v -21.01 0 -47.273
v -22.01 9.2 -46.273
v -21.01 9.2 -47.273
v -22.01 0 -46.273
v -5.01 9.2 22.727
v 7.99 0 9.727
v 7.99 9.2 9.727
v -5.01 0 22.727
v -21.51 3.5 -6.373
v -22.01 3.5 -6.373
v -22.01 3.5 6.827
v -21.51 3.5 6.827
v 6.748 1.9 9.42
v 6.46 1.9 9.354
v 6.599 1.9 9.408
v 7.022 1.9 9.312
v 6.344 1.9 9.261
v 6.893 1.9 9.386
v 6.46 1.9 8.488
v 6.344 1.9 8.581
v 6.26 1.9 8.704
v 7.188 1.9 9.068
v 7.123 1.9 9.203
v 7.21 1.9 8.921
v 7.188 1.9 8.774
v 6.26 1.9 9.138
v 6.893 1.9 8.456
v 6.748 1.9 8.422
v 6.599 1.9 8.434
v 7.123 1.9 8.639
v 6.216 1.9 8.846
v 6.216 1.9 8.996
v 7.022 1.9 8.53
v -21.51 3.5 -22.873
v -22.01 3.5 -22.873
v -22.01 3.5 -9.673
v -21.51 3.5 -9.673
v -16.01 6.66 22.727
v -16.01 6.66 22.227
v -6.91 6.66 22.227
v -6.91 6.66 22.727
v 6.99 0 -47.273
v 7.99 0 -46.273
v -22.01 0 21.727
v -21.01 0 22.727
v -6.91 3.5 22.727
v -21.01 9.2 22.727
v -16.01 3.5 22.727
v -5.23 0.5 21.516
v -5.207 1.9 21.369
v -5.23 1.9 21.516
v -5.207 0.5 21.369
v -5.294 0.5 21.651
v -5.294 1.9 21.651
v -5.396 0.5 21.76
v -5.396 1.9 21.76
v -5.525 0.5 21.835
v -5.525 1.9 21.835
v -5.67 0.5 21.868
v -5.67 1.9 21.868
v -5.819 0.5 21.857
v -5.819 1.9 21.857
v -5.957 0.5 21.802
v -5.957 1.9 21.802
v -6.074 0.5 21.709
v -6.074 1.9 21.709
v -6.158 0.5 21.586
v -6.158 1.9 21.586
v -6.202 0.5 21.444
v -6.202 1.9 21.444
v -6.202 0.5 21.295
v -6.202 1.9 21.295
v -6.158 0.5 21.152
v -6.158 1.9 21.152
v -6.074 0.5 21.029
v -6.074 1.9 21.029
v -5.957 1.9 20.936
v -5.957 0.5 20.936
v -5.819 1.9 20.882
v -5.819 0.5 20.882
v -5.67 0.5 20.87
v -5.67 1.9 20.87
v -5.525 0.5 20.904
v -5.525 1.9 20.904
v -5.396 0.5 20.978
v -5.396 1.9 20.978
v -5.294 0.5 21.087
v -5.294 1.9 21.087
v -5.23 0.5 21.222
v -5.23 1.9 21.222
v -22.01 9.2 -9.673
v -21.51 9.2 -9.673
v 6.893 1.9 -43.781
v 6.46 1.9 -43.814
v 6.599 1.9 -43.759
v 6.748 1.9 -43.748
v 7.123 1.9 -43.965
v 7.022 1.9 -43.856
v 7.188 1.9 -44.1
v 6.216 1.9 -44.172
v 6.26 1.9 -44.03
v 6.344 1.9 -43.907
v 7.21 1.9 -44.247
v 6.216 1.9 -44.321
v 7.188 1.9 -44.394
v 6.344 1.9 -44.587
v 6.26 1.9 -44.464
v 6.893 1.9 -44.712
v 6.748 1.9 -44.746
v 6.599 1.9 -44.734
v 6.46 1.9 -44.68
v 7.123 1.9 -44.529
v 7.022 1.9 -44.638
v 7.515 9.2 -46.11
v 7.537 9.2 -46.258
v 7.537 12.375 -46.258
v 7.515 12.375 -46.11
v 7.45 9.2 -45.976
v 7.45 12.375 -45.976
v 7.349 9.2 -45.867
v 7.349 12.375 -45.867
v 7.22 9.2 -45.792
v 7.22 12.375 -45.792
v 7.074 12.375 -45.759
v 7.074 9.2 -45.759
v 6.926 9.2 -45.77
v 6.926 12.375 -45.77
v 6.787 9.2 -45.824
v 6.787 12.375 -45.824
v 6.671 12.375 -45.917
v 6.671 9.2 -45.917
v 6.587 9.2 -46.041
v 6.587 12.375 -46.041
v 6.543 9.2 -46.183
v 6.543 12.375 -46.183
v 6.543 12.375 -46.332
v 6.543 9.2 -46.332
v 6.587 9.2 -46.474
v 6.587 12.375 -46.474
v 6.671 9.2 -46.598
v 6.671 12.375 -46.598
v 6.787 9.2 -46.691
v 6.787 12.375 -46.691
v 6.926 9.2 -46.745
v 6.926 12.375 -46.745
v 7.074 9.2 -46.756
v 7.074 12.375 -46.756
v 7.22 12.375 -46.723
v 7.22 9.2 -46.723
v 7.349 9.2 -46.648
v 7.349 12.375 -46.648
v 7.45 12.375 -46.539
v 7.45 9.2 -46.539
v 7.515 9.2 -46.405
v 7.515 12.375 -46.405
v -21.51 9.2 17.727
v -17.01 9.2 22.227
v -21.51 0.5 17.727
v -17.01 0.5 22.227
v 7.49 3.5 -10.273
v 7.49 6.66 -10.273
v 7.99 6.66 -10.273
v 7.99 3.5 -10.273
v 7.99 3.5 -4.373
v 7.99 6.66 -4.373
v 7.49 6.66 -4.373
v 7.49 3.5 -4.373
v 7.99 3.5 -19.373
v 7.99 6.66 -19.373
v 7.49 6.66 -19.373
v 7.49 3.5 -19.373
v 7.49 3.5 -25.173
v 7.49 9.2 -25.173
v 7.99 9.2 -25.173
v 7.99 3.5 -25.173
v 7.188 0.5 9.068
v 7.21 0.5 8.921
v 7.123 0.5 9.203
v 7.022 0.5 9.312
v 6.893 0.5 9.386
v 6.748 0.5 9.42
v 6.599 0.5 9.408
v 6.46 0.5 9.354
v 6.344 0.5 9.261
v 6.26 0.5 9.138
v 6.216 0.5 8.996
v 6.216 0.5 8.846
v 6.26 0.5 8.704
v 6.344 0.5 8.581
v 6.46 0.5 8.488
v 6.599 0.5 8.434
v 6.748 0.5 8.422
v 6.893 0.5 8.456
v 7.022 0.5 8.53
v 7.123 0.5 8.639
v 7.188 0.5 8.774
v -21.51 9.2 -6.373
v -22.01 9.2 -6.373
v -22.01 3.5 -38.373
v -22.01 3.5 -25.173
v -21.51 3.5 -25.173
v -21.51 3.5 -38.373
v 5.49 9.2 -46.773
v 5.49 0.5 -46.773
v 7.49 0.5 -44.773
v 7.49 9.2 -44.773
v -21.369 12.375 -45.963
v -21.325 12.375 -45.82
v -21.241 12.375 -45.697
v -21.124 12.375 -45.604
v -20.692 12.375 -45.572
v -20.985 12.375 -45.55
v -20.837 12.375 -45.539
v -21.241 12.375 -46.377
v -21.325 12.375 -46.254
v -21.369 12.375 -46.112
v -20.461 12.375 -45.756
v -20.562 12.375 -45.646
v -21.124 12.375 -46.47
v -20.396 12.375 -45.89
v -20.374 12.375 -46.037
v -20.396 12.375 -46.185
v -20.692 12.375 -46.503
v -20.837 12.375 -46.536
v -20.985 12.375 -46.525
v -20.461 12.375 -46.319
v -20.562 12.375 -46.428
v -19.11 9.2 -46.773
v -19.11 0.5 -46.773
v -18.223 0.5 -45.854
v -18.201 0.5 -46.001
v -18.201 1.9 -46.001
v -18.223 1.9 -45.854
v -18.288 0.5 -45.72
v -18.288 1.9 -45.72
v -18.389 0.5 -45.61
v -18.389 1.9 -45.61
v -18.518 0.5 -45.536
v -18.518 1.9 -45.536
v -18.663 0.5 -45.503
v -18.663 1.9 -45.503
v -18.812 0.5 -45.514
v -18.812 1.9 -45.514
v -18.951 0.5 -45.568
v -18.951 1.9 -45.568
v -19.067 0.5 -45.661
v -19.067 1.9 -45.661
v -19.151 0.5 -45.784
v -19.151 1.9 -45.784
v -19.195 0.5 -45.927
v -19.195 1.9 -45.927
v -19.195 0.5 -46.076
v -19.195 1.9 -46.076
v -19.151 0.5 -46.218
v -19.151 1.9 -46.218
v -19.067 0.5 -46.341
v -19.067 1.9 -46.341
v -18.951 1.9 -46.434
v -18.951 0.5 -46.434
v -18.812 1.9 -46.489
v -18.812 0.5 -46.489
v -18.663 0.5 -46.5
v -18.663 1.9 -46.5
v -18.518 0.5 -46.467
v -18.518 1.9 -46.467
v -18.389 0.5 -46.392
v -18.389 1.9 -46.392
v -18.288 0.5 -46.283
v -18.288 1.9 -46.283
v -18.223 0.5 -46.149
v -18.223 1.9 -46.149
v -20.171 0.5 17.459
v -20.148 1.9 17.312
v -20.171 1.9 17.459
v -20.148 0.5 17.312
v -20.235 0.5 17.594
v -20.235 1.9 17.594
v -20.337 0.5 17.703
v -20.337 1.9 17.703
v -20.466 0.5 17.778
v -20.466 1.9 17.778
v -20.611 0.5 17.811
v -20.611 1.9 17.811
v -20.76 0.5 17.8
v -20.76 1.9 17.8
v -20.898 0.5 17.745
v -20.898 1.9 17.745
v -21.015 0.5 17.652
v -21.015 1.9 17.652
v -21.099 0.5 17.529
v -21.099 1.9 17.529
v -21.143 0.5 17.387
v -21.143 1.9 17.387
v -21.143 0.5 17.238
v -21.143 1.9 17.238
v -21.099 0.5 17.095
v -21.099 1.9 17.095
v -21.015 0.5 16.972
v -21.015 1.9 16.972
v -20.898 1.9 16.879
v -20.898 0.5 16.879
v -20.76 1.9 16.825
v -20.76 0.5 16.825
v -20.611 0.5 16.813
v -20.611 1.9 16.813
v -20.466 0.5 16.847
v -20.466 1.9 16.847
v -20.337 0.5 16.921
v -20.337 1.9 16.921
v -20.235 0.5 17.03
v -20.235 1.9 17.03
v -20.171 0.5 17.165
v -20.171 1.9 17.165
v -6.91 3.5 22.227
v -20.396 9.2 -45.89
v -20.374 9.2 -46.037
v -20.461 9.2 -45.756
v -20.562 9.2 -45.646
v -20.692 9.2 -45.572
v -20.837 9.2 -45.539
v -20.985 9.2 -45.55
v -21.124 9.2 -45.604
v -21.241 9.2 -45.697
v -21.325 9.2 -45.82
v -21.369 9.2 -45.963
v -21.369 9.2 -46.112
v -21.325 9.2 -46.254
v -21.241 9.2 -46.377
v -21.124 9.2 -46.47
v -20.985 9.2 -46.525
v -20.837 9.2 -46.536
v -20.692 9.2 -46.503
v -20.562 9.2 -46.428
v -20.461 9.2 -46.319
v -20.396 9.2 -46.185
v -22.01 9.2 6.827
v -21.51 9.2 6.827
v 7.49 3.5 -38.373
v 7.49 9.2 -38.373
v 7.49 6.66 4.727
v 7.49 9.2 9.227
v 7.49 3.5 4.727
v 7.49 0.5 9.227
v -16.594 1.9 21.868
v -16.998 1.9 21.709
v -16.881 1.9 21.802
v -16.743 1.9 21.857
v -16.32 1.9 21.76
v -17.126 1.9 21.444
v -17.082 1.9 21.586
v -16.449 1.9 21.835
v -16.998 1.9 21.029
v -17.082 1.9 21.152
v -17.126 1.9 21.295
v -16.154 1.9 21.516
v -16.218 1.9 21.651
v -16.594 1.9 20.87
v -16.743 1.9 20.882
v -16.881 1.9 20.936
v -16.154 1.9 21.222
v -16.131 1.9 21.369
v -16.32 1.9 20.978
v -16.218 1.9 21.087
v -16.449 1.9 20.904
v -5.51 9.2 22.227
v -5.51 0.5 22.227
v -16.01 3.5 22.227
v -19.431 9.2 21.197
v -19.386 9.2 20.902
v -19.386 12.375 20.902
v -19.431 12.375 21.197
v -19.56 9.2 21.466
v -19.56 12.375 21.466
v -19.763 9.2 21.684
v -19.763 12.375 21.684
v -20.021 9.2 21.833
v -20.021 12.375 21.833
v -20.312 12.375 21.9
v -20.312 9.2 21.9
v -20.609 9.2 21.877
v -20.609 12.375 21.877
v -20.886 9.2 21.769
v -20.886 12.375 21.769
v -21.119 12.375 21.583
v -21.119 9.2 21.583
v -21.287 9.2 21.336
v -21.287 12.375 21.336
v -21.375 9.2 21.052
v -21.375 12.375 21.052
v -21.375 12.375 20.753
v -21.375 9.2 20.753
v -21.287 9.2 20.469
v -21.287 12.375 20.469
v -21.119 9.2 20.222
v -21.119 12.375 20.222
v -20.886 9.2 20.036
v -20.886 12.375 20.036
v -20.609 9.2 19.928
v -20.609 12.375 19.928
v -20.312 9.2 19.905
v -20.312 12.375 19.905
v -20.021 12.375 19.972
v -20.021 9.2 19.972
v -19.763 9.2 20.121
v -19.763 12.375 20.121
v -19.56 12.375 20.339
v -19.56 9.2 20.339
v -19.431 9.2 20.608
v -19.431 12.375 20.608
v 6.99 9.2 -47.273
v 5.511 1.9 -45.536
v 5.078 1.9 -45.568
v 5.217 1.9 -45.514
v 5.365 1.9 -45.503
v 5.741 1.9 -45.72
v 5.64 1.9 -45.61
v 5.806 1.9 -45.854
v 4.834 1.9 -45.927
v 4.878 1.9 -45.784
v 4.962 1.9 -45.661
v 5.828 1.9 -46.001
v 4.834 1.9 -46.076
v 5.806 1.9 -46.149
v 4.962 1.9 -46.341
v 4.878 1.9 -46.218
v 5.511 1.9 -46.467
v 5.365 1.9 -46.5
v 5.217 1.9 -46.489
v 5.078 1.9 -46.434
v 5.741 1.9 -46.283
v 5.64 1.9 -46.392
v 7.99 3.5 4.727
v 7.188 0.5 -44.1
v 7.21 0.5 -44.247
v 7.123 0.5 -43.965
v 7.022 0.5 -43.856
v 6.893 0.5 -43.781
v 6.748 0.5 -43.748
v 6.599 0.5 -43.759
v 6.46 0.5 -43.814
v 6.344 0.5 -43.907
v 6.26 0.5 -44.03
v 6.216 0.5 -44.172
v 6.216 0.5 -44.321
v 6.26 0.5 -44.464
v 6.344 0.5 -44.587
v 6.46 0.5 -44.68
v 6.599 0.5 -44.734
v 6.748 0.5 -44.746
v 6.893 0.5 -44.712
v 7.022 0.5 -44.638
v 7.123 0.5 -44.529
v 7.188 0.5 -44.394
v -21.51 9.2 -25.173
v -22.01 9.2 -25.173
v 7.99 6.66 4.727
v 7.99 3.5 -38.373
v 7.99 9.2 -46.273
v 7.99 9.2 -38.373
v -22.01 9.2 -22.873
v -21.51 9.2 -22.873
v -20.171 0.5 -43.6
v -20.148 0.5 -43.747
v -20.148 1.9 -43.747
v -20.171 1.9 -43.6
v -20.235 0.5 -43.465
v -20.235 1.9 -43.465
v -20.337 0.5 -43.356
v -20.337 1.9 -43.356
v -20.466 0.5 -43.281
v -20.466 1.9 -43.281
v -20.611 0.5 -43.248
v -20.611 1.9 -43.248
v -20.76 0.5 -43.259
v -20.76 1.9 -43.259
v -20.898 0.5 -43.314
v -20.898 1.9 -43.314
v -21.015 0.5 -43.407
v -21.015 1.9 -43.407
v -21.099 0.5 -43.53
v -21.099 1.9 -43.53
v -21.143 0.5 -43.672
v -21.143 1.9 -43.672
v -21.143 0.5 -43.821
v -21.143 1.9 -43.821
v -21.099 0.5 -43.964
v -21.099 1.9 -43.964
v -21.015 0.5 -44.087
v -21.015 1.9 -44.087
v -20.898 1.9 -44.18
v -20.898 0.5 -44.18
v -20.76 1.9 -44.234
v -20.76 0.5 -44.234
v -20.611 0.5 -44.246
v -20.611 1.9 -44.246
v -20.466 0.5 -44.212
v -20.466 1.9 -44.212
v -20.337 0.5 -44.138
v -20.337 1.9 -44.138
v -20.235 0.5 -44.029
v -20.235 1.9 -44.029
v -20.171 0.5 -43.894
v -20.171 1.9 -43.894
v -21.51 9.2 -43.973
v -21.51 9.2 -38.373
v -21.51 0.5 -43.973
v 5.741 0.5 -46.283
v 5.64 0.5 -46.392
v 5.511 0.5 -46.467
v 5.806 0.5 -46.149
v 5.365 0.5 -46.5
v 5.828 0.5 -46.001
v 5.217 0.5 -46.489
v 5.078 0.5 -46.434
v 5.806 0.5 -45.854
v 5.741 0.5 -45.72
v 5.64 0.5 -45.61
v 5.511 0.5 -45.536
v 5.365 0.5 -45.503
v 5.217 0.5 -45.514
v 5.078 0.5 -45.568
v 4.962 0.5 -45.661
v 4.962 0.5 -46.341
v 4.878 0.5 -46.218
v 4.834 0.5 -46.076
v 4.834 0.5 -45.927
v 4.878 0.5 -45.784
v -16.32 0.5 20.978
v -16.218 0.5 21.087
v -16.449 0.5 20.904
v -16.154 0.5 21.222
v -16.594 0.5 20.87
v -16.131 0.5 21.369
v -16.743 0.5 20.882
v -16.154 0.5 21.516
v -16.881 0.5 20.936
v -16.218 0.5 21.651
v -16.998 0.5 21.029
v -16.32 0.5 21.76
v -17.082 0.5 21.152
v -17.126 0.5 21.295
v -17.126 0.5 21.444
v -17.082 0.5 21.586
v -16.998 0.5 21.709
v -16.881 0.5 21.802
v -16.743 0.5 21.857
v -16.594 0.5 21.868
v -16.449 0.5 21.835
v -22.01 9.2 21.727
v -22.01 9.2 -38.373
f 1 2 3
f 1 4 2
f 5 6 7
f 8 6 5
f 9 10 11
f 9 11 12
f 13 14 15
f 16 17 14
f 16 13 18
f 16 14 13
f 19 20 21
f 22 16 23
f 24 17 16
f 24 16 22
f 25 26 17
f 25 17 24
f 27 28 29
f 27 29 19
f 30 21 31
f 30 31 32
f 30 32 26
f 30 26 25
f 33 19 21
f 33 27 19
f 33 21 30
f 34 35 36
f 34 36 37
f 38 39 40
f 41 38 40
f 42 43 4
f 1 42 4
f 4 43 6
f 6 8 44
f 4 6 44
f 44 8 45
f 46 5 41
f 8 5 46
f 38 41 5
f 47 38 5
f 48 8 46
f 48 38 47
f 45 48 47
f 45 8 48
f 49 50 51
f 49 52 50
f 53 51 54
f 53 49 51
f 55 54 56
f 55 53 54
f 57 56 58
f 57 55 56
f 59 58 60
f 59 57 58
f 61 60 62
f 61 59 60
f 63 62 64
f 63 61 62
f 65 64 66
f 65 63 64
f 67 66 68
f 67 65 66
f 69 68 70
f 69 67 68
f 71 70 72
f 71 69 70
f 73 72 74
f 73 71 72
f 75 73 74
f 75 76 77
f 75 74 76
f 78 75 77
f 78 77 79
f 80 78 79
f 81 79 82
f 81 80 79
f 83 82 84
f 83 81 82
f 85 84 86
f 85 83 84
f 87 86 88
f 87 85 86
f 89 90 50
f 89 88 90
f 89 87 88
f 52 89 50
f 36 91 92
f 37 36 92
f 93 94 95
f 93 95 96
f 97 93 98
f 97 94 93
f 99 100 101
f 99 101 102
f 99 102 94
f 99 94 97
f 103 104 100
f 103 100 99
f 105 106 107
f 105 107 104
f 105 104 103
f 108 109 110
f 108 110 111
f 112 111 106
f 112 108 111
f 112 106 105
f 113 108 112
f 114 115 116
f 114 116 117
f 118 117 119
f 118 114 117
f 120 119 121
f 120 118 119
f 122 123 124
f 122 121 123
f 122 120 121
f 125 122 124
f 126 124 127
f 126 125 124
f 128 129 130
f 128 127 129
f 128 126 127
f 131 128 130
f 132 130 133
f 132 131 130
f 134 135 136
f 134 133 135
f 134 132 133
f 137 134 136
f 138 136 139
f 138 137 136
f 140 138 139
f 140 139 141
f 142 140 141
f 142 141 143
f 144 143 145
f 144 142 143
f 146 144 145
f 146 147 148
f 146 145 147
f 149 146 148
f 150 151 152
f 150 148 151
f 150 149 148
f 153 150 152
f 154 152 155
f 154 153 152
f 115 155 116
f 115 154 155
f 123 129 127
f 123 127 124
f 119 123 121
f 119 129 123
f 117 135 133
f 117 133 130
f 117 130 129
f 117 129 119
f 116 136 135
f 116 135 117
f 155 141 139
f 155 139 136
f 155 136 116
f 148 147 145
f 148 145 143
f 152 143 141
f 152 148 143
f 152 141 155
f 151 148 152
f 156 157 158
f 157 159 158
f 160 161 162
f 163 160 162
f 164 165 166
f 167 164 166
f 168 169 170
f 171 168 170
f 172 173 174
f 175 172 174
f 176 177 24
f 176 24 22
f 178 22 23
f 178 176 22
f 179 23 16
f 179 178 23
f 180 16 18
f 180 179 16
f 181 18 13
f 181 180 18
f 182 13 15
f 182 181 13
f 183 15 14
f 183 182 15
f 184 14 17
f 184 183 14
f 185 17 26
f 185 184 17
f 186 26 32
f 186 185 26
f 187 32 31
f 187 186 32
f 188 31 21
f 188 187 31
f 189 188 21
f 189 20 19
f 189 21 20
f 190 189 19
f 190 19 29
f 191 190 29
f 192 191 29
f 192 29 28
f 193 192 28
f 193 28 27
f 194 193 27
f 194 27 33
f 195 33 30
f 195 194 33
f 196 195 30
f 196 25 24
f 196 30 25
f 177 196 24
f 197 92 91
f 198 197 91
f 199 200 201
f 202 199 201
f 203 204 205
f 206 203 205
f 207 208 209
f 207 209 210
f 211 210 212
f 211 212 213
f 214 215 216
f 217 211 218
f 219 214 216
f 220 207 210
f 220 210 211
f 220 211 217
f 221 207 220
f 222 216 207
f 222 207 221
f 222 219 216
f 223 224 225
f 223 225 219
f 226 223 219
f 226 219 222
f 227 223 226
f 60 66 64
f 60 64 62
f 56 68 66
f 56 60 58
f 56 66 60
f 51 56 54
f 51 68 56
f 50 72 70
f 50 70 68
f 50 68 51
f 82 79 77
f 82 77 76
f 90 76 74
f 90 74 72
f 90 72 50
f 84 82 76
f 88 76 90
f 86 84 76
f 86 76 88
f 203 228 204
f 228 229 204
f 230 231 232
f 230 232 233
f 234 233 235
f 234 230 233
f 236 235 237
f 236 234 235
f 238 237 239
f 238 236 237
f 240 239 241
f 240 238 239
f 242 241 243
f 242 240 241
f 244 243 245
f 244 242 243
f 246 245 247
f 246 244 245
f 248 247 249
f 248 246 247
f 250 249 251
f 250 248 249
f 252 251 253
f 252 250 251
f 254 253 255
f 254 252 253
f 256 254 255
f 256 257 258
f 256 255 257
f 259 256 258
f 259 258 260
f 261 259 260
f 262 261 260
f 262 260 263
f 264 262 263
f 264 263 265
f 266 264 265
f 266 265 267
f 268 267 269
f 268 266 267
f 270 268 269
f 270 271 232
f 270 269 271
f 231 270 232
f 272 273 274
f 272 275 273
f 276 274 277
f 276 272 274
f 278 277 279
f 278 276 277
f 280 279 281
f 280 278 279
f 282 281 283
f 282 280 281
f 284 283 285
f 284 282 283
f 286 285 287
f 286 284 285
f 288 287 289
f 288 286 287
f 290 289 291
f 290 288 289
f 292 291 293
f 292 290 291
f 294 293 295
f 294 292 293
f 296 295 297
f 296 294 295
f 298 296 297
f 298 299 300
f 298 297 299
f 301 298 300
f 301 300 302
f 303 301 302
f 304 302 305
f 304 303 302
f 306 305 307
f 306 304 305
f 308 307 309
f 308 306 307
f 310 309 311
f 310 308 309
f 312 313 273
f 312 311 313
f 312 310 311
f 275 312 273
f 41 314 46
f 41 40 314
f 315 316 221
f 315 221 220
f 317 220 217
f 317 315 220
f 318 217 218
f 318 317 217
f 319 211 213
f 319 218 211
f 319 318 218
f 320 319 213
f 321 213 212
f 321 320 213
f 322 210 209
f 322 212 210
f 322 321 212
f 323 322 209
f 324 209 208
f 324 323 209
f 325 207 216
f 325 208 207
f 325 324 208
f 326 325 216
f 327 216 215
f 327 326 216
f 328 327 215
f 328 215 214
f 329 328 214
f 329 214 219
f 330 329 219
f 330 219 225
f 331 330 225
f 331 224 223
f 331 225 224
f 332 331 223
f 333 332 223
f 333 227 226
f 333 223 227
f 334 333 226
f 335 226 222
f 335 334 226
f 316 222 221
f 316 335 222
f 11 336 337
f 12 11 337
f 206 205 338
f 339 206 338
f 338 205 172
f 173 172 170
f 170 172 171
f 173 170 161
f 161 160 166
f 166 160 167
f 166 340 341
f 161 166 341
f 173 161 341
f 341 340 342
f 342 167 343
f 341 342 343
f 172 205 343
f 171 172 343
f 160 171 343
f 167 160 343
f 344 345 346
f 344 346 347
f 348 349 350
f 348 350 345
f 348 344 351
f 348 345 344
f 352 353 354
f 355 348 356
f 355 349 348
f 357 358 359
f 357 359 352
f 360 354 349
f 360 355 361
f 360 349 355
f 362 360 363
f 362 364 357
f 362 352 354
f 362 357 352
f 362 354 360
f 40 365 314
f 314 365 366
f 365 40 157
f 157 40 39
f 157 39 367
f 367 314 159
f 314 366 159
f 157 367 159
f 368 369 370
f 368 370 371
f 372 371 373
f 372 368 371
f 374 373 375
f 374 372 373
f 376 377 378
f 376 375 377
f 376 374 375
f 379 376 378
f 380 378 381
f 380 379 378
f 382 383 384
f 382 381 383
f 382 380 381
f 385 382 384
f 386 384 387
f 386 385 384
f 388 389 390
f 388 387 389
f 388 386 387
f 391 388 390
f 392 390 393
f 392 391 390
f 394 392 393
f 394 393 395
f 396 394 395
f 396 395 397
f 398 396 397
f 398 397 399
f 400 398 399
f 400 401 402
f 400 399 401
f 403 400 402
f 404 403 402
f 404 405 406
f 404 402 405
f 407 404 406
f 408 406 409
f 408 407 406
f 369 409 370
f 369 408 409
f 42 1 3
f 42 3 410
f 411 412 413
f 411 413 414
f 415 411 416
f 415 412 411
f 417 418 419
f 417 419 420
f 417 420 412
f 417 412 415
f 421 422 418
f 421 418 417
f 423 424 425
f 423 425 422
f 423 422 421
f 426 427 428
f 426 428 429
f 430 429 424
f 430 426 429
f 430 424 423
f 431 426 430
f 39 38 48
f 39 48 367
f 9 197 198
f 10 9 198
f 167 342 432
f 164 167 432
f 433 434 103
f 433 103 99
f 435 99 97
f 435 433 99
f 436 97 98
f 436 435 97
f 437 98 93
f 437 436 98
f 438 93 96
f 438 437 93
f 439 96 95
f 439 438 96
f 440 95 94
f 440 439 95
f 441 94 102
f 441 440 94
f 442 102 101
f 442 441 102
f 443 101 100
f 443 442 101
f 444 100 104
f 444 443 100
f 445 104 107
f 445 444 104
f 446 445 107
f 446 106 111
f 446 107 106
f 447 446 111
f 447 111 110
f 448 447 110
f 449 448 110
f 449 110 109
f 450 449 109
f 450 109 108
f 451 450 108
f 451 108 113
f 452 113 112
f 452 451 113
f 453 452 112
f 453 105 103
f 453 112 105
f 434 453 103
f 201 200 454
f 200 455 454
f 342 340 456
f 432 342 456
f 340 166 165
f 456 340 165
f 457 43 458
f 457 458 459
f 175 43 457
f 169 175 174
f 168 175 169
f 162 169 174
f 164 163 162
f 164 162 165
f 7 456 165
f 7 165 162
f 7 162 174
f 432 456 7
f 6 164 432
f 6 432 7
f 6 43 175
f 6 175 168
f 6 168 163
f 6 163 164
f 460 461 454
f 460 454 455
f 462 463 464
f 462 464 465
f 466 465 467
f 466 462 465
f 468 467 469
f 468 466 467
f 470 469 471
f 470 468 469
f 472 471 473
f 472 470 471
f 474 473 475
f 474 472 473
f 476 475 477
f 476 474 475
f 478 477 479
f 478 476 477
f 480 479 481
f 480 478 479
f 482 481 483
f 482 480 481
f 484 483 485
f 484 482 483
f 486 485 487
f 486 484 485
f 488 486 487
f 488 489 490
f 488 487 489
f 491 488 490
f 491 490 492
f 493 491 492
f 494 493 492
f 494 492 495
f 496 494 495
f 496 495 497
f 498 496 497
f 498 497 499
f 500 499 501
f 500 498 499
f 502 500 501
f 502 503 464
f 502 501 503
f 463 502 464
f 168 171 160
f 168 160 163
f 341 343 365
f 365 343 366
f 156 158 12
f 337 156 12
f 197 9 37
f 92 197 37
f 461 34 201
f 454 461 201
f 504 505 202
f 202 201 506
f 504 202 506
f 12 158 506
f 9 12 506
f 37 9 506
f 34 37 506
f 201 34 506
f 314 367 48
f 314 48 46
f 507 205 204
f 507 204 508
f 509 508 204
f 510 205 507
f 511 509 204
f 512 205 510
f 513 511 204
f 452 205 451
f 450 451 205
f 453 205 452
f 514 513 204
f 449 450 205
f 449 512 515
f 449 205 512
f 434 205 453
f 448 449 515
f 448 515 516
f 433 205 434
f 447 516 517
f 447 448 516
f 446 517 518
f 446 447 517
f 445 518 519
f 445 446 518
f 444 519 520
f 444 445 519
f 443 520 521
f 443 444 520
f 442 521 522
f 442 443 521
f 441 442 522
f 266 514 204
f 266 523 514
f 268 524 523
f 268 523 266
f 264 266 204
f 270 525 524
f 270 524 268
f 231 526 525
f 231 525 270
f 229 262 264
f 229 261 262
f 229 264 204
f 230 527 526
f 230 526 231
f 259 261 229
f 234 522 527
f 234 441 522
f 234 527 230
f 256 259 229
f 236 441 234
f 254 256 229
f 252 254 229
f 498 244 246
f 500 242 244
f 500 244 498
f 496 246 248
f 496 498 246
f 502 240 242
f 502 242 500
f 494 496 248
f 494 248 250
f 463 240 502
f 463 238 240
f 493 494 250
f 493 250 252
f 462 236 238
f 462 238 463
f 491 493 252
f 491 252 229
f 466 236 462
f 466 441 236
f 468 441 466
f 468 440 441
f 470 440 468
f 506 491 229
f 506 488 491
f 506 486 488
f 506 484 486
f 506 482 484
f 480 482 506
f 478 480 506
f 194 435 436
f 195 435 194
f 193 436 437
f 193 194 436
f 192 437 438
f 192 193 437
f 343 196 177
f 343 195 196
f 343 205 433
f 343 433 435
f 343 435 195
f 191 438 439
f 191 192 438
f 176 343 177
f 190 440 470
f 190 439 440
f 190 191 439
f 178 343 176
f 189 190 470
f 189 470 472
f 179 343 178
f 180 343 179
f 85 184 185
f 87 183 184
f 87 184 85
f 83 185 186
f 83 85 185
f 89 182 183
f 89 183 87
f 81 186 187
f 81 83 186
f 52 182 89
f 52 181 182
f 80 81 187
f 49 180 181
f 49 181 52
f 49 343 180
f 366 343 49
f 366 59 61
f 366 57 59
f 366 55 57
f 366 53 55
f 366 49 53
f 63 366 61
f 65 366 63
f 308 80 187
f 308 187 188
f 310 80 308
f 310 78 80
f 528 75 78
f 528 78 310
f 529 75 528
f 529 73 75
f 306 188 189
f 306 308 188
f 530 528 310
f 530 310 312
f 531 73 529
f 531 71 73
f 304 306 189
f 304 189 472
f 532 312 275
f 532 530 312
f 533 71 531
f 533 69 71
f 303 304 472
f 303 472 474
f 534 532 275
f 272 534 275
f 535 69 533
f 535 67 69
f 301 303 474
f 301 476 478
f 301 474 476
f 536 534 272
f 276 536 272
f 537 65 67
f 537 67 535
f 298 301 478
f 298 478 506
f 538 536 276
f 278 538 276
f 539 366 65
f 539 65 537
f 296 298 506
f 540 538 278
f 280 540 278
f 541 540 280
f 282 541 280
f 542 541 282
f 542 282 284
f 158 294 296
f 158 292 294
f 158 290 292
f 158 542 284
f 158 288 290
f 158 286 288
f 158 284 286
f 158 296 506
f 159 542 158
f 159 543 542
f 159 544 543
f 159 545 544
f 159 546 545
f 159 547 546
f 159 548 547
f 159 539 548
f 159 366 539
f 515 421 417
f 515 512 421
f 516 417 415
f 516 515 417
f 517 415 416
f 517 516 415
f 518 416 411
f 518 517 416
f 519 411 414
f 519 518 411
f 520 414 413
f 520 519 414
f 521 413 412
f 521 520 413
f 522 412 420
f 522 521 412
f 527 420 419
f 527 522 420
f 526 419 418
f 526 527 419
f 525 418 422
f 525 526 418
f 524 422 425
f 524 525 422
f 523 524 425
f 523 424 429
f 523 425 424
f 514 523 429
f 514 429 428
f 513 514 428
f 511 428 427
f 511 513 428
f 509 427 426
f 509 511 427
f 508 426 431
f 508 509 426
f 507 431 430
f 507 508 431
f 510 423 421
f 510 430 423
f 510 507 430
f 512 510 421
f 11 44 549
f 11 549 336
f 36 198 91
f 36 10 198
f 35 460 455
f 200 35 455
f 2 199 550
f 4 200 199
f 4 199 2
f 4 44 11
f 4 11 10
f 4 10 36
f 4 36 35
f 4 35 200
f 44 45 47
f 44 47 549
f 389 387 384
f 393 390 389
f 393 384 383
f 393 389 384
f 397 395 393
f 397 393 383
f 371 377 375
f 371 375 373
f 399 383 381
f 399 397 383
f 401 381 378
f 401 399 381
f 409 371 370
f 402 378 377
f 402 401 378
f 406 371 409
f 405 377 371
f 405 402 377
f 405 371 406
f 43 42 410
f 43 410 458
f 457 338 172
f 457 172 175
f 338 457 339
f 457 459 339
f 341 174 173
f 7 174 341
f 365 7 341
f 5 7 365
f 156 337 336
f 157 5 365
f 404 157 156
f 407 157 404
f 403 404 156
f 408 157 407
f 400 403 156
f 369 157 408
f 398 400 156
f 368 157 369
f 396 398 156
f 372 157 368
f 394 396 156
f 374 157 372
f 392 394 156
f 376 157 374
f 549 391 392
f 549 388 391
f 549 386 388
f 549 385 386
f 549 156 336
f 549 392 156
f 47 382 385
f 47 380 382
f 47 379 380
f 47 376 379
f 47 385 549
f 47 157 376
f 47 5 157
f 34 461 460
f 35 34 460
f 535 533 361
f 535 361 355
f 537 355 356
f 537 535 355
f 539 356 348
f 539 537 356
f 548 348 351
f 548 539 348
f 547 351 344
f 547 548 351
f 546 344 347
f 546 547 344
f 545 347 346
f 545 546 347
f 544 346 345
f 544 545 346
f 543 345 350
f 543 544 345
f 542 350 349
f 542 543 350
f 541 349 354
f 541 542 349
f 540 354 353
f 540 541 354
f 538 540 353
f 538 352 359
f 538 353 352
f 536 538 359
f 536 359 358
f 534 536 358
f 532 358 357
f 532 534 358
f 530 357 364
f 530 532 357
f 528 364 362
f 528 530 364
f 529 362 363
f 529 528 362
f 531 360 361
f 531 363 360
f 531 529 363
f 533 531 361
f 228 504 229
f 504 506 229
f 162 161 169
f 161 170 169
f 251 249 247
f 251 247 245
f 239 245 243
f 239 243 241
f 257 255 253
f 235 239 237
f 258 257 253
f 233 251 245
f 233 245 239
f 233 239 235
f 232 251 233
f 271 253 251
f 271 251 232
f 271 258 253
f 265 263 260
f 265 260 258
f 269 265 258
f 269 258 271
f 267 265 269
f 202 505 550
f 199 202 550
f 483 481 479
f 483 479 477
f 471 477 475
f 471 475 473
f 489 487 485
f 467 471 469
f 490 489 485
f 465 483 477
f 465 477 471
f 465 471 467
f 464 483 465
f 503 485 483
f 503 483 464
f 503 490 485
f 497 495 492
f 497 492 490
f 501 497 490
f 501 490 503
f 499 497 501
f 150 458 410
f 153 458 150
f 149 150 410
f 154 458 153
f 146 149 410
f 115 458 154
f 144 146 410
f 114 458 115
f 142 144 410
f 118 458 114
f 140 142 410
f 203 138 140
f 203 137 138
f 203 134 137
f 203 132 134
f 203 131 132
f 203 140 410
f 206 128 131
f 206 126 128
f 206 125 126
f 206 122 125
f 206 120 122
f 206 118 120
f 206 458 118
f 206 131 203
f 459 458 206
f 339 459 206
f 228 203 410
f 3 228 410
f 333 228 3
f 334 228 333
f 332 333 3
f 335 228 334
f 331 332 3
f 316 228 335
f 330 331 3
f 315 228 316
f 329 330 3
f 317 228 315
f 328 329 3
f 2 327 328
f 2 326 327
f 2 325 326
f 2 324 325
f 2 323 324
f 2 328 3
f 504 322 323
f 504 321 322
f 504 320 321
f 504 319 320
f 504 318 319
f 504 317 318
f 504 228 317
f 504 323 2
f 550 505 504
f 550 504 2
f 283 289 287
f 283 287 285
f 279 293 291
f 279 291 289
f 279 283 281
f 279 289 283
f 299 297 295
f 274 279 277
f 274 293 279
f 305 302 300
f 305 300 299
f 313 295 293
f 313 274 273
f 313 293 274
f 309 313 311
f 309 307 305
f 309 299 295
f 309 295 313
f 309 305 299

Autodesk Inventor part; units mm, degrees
ref_plane "YZ Plane" through (0, 0, 0) normal (1, 0, 0) x (0, 1, 0)
ref_plane "XZ Plane" through (0, 0, 0) normal (0, 1, 0) x (-1, 0, 0)
ref_plane "XY Plane" through (0, 0, 0) normal (0, 0, 1) x (1, 0, 0)
sketch "Sketch1" plane through (0, 0, 0) normal (0, 1, 0) x (-1, 0, 0)
  line L0 (21.5102, 17.7267) -> (21.5102, -43.9733)
  line L1 (21.5102, -43.9733) -> (19.1102, -46.7733)
  line L2 (19.1102, -46.7733) -> (-5.4898, -46.7733)
  line L3 (-5.4898, -46.7733) -> (-7.4898, -44.7733)
  line L4 (-7.4898, -44.7733) -> (-7.4898, 9.2267)
  line L5 (-7.4898, 9.2267) -> (5.5102, 22.2267)
  line L6 (5.5102, 22.2267) -> (17.0102, 22.2267)
  line L7 (17.0102, 22.2267) -> (21.5102, 17.7267)
  line L8 (22.0102, 21.7267) -> (22.0102, -46.2733)
  line L9 (22.0102, -46.2733) -> (21.0102, -47.2733)
  line L10 (21.0102, -47.2733) -> (-6.9898, -47.2733)
  line L11 (-6.9898, -47.2733) -> (-7.9898, -46.2733)
  line L12 (-7.9898, -46.2733) -> (-7.9898, 9.7267)
  line L13 (-7.9898, 9.7267) -> (5.0102, 22.7267)
  line L14 (5.0102, 22.7267) -> (21.0102, 22.7267)
  line L15 (21.0102, 22.7267) -> (22.0102, 21.7267)
  point P0 (0, 0)
  point P1 (14.1019, -14.4492)
  dimension "d0" = 69
  dimension "d1" = 29
  dimension "d2" = 2
  dimension "d3" = 2
  dimension "d4" = 2.8
  dimension "d5" = 2.4
  dimension "d6" = 4.5
  dimension "d7" = 4.5
  dimension "d8" = 13
  dimension "d9" = 13
  dimension "d10" = 70
  dimension "d11" = 30
  dimension "d12" = 1
  dimension "d13" = 1
  dimension "d14" = 1
  dimension "d15" = 1
  dimension "d16" = 1
  dimension "d17" = 1
  dimension "d18" = 13
  dimension "d19" = 13
  dimension "d34" = 0.5
  dimension "d35" = 0.5
extrude "Extrusion1" add sketch "Sketch1" along normal blind 0.5 contours L0 L1 L2 L3 L4 L5 L6 L7 | L8 L9 L10 L11 L12 L13 L14 L15
extrude "Extrusion2" add sketch "Sketch1" along normal blind 9.2
sketch "Sketch2" plane through (0, 0.5, 0) normal (0, 1, 0) x (1, 0, 0)
  circle A0 centre (-20.6484, -17.3121) radius 0.5
  circle A1 centre (-16.6313, -21.3691) radius 0.5
  circle A2 centre (-5.7074, -21.3691) radius 0.5
  circle A3 centre (6.7103, -8.921) radius 0.5
  circle A4 centre (6.7103, 44.2469) radius 0.5
  circle A5 centre (5.3281, 46.0012) radius 0.5
  circle A6 centre (-20.6484, 43.7469) radius 0.5
  circle A7 centre (-18.7007, 46.0012) radius 0.5
  point P0 (0, 0)
  dimension "d24" = 1
  dimension "d25" = 1
  dimension "d26" = 1
  dimension "d27" = 1
  dimension "d28" = 1
  dimension "d29" = 1
  dimension "d30" = 1
  dimension "d31" = 1
extrude "Extrusion3" add sketch "Sketch2" along normal blind 1.4
sketch "Sketch3" plane through (0, 9.2, 0) normal (0, 1, 0) x (1, 0, 0)
  line L0 (-21.0102, -22.7267) -> (-5.0102, -22.7267) projected
  line L1 (-5.0102, -22.7267) -> (7.9898, -9.7267) projected
  line L2 (7.9898, -9.7267) -> (7.9898, 46.2733) projected
  line L3 (7.9898, 46.2733) -> (6.9898, 47.2733) projected
  line L4 (6.9898, 47.2733) -> (-21.0102, 47.2733) projected
  line L5 (-21.0102, 47.2733) -> (-22.0102, 46.2733) projected
  line L6 (-22.0102, 46.2733) -> (-22.0102, -21.7267) projected
  line L7 (-22.0102, -21.7267) -> (-21.0102, -22.7267) projected
  line L8 (-21.5102, -17.7267) -> (-21.5102, 43.9733) projected
  line L9 (-19.1102, 46.7733) -> (5.4898, 46.7733) projected
  line L10 (7.4898, 44.7733) -> (7.4898, -9.2267) projected
  line L11 (7.4898, -9.2267) -> (-5.5102, -22.2267) projected
  line L12 (-5.5102, -22.2267) -> (-17.0102, -22.2267) projected
  line L13 (-17.0102, -22.2267) -> (-21.5102, -17.7267) projected
  line L14 (-5.5102, -22.2267) -> (-17.0102, -22.2267) projected
  line L15 (-21.0102, -22.7267) -> (-5.0102, -22.7267) projected
  line L16 (-16.0102, -22.2267) -> (-6.9102, -22.2267)
  line L17 (-6.9102, -22.2267) -> (-6.9102, -22.7267)
  line L18 (-6.9102, -22.7267) -> (-16.0102, -22.7267)
  line L19 (-16.0102, -22.7267) -> (-16.0102, -22.2267)
  line L20 (-21.5102, 43.9733) -> (-19.1102, 46.7733) projected
  line L21 (5.4898, 46.7733) -> (7.4898, 44.7733) projected
  line L22 (7.4898, -4.7267) -> (7.9898, -4.7267)
  line L23 (7.9898, -4.7267) -> (7.9898, 4.3733)
  line L24 (7.9898, 4.3733) -> (7.4898, 4.3733)
  line L25 (7.4898, 4.3733) -> (7.4898, -4.7267)
  line L26 (7.4898, 10.2733) -> (7.9898, 10.2733)
  line L27 (7.9898, 10.2733) -> (7.9898, 19.3733)
  line L28 (7.9898, 19.3733) -> (7.4898, 19.3733)
  line L29 (7.4898, 19.3733) -> (7.4898, 10.2733)
  line L30 (7.4898, 25.1733) -> (7.9898, 25.1733)
  line L31 (7.9898, 25.1733) -> (7.9898, 38.3733)
  line L32 (7.9898, 38.3733) -> (7.4898, 38.3733)
  line L33 (7.4898, 38.3733) -> (7.4898, 25.1733)
  line L34 (-22.0102, -6.8267) -> (-21.5102, -6.8267)
  line L35 (-21.5102, -6.8267) -> (-21.5102, 6.3733)
  line L36 (-21.5102, 6.3733) -> (-22.0102, 6.3733)
  line L37 (-22.0102, 6.3733) -> (-22.0102, -6.8267)
  line L38 (-21.5102, 43.9733) -> (-21.5102, -17.7267) projected
  line L39 (-22.0102, 9.6733) -> (-21.5102, 9.6733)
  line L40 (-21.5102, 9.6733) -> (-21.5102, 22.8733)
  line L41 (-21.5102, 22.8733) -> (-22.0102, 22.8733)
  line L42 (-22.0102, 22.8733) -> (-22.0102, 9.6733)
  line L43 (-22.0102, 25.1733) -> (-21.5102, 25.1733)
  line L44 (-21.5102, 25.1733) -> (-21.5102, 38.3733)
  line L45 (-21.5102, 38.3733) -> (-22.0102, 38.3733)
  line L46 (-22.0102, 38.3733) -> (-22.0102, 25.1733)
  point P0 (0, 0)
  point P1 (-16.0102, -22.4767)
  point P2 (-6.9102, -22.4767)
  point P3 (7.7398, -4.7267)
  point P4 (7.7398, 4.3733)
  point P5 (7.7398, 19.3733)
  point P6 (7.7398, 10.2733)
  point P7 (7.7398, 25.1733)
  point P8 (7.7398, 38.3733)
  point P9 (-21.7602, 6.3733)
  point P10 (-21.7602, -6.8267)
  point P11 (-21.7602, 9.6733)
  point P12 (-21.7602, 22.8733)
  point P13 (-21.7602, 38.3733)
  point P14 (-21.7602, 25.1733)
  dimension "d36" = 1
  dimension "d37" = 1.4
  dimension "d38" = 4.5
  dimension "d39" = 9.1
  dimension "d40" = 5.7462
  dimension "d41" = 5.9
  dimension "d42" = 9.1
  dimension "d43" = 5.8
  dimension "d44" = 13.2
  dimension "d45" = 13.2
  dimension "d46" = 10.9
  dimension "d47" = 3.3
  dimension "d48" = 13.2
  dimension "d49" = 13.2
  dimension "d50" = 2.3
extrude "Extrusion4" cut sketch "Sketch3" against normal blind 5.7 contours L19 L12 L17 L0 | L6 L36 L8 L34 | L6 L41 L8 L39 | L22 L10 L24 L2 | L6 L45 L8 L43 | L26 L10 L28 L2 | L30 L10 L32 L2
sketch "Sketch4" plane through (0, 9.2, 0) normal (0, 1, 0) x (1, 0, 0)
  line L0 (-6.9102, -22.7267) -> (-16.0102, -22.7267) projected
  line L1 (-6.9102, -22.2267) -> (-6.9102, -22.7267) projected
  line L2 (-16.0102, -22.2267) -> (-6.9102, -22.2267) projected
  line L3 (-16.0102, -22.7267) -> (-16.0102, -22.2267) projected
  line L4 (7.4898, -4.7267) -> (7.4898, 4.3733) projected
  line L5 (7.9898, -4.7267) -> (7.4898, -4.7267) projected
  line L6 (7.9898, 4.3733) -> (7.9898, -4.7267) projected
  line L7 (7.4898, 4.3733) -> (7.9898, 4.3733) projected
  line L8 (7.4898, 10.2733) -> (7.4898, 19.3733) projected
  line L9 (7.9898, 10.2733) -> (7.4898, 10.2733) projected
  line L10 (7.9898, 19.3733) -> (7.9898, 10.2733) projected
  line L11 (7.4898, 19.3733) -> (7.9898, 19.3733) projected
  point P0 (0, 0)
extrude "Extrusion5" add sketch "Sketch4" against normal blind 2.54
sketch "Sketch5" plane through (0, 9.2, 0) normal (0, 1, 0) x (1, 0, 0)
  circle A0 centre (-20.3864, -20.9025) radius 1
  circle A1 centre (-20.8742, 46.0372) radius 0.5
  circle A2 centre (7.0371, 46.2575) radius 0.5
  point P0 (0, 0)
  dimension "d55" = 2
  dimension "d56" = 1
  dimension "d57" = 1
extrude "Extrusion6" add sketch "Sketch5" along normal blind 3.175
equation "\"d9\" = d8"
equation "\"d19\" = d18"
properties part number "Bottom"
